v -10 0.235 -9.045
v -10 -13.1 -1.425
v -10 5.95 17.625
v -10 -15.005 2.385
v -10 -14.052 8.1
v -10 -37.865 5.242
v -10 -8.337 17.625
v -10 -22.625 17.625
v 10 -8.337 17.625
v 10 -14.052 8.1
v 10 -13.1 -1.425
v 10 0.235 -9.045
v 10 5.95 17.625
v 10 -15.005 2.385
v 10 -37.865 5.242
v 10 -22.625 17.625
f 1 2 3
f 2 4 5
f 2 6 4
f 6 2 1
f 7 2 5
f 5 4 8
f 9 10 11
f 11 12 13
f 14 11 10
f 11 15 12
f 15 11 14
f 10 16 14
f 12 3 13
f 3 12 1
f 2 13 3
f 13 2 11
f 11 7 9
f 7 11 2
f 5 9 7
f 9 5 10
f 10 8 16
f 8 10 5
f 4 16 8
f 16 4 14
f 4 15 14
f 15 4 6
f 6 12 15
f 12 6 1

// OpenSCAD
rotate([0,-90,0])
translate([-30, +25])
polyhedron(
    points=[
    [20.955, -24.765, 10],
    [47.625, -19.05, 10],
    [28.575, -38.1, 10],
    [47.625, -33.3375, 10],
    [38.1, -39.0525, 10],
    [47.625, -47.625, 10],
    [32.385, -40.005, 10],
    [35.2425, -62.865, 10],

    [20.955, -24.765, -10],
    [47.625, -19.05, -10],
    [28.575, -38.1, -10],
    [47.625, -33.3375, -10],
    [38.1, -39.0525, -10],
    [47.625, -47.625, -10],
    [32.385, -40.005, -10],
    [35.2425, -62.865, -10],
    ],
    faces=[
        [0,1,2,3,4,5,6,7],
        [15,14,13,12,11,10,9,8],
        [0,8,9,1],
        [1,9,10,2],
        [2,10,11,3],
        [3,11,12,4],
        [4,12,13,5],
        [5,13,14,6],
        [6,14,15,7],
        [7,15,8,0],
    ]
);
